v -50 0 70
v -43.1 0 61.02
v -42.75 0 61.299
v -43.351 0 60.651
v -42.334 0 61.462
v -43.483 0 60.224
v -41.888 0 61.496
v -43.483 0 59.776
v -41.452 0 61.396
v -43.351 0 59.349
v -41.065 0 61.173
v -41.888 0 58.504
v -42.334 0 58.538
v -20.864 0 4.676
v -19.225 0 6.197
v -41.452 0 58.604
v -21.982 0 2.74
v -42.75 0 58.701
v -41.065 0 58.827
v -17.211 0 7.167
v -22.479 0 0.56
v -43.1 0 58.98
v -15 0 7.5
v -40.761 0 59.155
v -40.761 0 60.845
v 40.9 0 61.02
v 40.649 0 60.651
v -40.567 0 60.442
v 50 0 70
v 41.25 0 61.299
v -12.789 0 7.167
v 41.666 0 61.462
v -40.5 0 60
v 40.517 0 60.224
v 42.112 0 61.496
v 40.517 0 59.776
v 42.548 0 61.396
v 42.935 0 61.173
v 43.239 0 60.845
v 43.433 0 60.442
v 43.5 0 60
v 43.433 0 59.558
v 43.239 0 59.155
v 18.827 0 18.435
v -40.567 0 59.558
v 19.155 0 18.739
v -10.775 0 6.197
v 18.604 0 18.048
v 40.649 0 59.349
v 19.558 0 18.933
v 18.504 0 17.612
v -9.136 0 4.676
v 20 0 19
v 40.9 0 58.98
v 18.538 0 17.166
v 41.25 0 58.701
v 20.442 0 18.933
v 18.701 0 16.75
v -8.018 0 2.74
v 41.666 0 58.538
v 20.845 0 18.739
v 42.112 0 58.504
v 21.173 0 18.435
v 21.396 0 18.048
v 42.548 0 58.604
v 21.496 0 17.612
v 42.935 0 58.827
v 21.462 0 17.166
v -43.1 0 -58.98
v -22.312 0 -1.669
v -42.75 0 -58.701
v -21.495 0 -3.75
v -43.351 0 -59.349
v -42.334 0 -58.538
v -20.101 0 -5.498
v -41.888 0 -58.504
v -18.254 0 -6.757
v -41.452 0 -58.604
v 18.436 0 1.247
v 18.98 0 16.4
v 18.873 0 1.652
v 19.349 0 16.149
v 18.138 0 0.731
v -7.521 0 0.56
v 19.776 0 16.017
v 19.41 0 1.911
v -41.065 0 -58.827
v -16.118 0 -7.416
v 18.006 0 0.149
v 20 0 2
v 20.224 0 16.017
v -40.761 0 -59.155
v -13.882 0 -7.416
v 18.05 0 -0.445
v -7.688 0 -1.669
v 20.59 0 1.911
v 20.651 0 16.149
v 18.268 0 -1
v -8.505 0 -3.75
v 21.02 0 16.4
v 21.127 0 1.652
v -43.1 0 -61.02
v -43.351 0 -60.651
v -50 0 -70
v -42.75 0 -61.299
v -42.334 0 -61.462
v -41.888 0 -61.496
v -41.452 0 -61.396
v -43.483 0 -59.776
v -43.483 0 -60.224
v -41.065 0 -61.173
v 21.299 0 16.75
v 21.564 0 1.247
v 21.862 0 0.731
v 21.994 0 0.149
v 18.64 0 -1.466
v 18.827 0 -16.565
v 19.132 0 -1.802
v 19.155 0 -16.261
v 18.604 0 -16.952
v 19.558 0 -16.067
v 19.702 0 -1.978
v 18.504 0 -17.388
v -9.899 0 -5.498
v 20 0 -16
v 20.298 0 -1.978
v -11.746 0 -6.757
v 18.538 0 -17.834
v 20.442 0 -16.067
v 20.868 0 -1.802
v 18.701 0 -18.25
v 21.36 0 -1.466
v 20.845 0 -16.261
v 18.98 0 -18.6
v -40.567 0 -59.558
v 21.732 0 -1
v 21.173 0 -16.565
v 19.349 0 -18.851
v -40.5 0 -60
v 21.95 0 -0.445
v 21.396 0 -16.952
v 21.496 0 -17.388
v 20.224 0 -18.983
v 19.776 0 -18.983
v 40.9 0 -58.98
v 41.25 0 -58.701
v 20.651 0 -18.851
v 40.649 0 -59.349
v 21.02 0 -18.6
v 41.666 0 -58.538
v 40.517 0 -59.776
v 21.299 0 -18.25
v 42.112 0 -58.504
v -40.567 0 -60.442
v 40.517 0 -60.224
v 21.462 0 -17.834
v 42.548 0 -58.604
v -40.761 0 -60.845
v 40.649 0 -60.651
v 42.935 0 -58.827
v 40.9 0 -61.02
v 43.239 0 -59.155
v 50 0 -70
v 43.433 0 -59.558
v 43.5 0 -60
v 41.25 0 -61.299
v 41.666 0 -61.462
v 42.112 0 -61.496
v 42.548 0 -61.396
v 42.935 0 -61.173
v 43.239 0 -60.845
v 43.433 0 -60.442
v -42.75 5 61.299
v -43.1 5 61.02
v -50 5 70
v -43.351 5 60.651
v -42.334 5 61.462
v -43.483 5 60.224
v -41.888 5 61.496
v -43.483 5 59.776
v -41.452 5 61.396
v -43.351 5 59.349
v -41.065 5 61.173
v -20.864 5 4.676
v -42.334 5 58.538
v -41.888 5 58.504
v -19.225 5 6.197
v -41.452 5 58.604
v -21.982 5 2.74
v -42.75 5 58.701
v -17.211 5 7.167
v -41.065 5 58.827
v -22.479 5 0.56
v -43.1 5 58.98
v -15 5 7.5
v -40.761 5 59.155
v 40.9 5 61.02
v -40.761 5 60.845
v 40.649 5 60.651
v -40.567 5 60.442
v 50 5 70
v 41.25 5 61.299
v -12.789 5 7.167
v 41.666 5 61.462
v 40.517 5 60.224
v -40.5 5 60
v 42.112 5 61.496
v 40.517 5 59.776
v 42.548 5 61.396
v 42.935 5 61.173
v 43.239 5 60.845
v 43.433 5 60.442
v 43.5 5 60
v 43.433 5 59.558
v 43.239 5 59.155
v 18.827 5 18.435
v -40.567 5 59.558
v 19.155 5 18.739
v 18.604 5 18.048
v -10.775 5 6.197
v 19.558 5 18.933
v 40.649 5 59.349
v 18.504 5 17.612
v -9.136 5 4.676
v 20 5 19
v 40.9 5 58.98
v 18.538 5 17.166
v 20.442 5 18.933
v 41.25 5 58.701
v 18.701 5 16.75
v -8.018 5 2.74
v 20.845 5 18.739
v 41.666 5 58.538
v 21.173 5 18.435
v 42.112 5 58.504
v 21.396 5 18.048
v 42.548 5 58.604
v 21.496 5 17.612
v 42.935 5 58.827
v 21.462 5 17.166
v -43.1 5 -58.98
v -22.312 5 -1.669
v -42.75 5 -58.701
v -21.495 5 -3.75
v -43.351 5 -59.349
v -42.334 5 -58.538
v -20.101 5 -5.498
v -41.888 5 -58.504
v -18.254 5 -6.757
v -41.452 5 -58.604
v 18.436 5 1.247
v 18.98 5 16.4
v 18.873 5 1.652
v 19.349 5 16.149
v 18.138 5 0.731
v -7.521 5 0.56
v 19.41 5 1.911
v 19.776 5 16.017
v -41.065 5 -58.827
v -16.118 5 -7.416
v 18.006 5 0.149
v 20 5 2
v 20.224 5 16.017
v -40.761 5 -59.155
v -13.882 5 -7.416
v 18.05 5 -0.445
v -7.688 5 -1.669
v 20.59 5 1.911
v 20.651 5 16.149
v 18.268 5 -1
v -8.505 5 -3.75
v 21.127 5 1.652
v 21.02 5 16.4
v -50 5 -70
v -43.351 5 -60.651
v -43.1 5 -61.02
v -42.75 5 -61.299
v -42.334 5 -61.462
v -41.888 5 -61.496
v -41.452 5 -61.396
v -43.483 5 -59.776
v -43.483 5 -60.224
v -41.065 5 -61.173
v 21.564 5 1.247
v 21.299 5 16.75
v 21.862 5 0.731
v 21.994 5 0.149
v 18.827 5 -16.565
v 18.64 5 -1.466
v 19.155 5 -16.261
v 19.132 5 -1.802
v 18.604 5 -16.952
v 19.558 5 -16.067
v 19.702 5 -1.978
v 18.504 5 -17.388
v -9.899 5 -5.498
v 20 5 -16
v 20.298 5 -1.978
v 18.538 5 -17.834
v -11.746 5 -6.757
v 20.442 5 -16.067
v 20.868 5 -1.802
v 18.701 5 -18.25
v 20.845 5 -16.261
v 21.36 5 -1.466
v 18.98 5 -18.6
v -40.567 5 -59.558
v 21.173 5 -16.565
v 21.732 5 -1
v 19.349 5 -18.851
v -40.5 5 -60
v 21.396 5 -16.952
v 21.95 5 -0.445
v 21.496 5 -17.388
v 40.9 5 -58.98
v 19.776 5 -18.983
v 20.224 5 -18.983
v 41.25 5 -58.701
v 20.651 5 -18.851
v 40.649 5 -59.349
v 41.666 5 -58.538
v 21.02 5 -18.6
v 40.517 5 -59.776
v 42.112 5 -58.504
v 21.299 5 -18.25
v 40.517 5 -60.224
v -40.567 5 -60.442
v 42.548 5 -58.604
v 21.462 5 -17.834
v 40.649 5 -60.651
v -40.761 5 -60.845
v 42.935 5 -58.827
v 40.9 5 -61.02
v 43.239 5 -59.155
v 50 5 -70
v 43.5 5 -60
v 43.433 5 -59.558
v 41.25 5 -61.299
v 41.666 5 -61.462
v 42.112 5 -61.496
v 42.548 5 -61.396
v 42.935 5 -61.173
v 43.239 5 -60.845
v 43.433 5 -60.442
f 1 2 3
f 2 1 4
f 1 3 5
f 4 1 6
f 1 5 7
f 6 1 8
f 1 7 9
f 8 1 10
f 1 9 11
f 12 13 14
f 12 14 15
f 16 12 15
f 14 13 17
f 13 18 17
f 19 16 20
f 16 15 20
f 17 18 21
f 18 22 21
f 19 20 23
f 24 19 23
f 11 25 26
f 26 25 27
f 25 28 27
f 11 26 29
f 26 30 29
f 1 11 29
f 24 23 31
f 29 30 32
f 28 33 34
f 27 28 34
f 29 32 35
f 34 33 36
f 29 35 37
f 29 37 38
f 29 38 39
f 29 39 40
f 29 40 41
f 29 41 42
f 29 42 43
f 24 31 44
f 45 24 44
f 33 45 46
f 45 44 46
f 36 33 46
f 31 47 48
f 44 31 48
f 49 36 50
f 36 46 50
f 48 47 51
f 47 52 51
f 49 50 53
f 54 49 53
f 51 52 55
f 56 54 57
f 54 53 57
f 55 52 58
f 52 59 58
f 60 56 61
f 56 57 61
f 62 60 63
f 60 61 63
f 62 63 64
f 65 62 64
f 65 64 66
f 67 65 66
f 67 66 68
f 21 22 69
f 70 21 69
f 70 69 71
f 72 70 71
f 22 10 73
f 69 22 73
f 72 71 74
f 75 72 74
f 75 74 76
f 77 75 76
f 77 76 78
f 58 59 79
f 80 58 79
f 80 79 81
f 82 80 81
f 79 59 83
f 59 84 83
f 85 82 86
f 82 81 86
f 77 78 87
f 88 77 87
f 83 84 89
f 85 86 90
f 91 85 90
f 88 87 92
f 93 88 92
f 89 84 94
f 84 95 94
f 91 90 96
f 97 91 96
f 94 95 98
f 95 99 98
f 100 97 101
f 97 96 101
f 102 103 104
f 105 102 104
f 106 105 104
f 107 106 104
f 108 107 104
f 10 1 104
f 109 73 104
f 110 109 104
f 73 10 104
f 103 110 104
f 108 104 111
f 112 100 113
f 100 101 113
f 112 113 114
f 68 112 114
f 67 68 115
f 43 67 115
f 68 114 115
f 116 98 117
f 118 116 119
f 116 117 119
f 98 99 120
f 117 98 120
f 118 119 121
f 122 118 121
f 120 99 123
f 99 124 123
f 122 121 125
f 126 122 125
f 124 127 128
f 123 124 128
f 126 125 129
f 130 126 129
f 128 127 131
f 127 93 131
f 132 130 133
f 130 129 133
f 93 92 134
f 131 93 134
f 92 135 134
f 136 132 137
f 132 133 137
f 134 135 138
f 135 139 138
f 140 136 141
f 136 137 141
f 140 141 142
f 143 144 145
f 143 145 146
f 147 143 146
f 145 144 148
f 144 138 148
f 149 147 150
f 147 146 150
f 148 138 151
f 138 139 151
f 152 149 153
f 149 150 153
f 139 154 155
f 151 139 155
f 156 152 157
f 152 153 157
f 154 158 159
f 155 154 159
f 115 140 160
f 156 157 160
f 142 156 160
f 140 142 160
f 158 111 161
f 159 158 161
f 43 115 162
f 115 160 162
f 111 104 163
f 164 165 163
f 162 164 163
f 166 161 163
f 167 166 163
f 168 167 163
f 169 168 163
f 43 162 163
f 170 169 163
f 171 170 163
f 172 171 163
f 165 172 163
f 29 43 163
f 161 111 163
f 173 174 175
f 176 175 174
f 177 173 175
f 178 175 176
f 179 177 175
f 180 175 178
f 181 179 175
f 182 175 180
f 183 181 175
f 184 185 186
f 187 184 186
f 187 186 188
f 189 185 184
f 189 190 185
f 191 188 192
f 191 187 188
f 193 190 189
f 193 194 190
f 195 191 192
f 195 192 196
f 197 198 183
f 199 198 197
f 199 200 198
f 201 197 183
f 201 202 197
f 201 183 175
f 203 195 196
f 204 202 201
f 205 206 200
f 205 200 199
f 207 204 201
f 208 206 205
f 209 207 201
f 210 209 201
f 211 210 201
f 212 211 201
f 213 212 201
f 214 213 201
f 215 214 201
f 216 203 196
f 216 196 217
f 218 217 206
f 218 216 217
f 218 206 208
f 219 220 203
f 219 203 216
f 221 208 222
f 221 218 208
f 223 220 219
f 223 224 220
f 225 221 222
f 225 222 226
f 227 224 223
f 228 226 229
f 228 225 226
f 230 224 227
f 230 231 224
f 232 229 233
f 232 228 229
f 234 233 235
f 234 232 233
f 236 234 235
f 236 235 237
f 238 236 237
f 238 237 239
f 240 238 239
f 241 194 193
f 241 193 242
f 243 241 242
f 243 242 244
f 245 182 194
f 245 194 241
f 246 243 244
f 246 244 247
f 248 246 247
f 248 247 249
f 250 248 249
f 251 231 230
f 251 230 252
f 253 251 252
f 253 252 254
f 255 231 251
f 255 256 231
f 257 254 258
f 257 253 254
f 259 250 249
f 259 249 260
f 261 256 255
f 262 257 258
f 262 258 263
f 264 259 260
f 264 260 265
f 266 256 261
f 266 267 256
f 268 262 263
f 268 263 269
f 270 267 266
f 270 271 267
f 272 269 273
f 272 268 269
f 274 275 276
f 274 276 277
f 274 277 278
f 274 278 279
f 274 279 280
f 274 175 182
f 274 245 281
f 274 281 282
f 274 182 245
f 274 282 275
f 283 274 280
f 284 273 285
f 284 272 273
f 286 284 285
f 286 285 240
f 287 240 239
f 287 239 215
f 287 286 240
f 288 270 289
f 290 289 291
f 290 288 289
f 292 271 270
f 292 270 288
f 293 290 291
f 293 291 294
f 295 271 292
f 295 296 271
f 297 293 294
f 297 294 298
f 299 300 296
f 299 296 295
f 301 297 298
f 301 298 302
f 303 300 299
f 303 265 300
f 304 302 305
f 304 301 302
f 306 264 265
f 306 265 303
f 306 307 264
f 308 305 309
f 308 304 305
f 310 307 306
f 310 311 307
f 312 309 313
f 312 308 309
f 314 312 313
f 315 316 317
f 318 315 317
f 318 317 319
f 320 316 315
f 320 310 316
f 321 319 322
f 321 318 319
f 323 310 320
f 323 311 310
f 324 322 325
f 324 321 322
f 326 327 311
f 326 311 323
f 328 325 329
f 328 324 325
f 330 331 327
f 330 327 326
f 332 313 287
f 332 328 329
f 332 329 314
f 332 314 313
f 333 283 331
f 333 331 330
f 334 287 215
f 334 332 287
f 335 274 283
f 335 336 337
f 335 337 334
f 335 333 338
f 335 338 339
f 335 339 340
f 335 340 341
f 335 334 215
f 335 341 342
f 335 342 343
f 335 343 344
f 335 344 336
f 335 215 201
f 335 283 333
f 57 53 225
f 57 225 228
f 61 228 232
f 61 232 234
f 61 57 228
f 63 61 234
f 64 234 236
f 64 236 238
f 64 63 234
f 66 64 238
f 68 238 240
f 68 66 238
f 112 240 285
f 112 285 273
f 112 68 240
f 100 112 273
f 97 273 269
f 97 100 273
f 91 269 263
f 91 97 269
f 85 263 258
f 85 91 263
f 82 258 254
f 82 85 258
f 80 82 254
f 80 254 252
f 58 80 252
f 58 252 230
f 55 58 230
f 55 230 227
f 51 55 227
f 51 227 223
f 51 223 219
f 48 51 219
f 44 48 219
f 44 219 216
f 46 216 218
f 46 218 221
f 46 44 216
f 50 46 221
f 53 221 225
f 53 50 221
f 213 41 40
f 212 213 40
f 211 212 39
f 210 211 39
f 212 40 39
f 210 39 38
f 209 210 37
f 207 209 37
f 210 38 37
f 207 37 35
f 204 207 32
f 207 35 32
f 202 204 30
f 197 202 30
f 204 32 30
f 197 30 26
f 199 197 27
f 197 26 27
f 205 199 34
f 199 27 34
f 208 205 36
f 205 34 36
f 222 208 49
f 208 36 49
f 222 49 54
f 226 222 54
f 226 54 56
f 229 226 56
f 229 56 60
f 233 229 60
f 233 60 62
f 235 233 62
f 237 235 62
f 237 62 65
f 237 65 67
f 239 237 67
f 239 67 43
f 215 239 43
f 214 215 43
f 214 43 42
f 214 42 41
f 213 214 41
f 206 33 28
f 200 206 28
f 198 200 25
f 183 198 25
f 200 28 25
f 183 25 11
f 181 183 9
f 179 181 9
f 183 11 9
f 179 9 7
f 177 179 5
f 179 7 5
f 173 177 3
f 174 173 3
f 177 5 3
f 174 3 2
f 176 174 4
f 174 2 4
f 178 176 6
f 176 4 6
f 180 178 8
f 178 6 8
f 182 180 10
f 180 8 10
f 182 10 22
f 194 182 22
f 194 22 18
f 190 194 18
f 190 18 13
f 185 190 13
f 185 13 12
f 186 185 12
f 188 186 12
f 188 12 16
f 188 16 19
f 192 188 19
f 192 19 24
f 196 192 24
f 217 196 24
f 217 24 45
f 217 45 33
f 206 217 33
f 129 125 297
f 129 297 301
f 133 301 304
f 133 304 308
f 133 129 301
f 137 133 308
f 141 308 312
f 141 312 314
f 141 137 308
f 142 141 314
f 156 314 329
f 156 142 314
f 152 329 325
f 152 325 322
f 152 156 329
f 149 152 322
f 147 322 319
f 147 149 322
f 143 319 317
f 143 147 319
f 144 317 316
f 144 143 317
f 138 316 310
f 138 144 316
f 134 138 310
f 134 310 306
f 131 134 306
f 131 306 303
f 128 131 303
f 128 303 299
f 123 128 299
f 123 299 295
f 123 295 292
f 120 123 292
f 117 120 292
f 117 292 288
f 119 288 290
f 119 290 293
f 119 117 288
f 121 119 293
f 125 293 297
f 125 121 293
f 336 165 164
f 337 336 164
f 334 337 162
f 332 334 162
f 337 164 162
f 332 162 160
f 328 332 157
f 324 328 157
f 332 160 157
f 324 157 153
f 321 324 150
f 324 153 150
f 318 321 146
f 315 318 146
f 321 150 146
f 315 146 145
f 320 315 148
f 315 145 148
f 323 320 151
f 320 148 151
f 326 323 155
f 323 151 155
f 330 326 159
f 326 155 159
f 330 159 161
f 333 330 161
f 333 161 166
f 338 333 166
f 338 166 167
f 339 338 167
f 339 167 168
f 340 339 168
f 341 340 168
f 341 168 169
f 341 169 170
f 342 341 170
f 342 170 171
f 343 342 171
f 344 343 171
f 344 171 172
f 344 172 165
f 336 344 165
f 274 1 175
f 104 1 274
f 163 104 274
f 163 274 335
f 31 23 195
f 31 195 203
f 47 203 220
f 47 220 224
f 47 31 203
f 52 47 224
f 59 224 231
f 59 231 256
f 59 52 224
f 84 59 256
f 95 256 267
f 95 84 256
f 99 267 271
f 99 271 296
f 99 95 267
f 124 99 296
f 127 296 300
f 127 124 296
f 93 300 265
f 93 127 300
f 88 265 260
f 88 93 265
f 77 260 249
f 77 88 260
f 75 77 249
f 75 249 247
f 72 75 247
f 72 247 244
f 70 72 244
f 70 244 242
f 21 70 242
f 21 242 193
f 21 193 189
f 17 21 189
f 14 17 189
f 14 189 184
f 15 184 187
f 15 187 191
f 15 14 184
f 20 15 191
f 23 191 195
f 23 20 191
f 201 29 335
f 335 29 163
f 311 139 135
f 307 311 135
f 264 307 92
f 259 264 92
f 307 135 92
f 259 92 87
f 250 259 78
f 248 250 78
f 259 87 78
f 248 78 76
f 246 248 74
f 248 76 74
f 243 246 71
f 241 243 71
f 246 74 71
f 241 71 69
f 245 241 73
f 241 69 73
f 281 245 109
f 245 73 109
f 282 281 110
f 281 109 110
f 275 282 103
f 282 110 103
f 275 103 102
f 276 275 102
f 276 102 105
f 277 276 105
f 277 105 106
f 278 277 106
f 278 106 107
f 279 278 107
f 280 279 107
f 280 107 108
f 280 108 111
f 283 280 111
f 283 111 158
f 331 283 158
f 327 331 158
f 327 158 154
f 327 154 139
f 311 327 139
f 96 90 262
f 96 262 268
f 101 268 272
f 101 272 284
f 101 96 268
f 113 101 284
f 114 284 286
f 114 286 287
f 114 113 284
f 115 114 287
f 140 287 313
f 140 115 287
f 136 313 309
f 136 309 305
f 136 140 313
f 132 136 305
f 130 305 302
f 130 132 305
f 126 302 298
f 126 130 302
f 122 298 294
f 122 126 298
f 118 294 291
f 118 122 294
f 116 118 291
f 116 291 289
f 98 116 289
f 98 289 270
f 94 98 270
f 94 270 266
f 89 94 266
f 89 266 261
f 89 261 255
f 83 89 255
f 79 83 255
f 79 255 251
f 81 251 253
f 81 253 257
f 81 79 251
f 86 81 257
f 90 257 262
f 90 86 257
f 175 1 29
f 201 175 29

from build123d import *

# Parameters (mm, degrees)
SKETCH1_W                = 100
SKETCH1_H                = 140
SKETCH1_R                = 7.5
SKETCH1_R_2              = 2
SKETCH1_R_3              = 1.5
BOSS_EXTRUDE1_DEPTH      = 5
F_3_0_3_DIAMETER_HOLE1_D = 3


with BuildPart() as part:
    # Sketch1 → Boss-Extrude1 (new body)
    with BuildSketch(Plane(origin=(0, 0, 0), x_dir=(1, 0, 0), z_dir=(0, 1, 0))):
        Rectangle(SKETCH1_W, SKETCH1_H)
        with Locations((-15, 0)):
            Circle(SKETCH1_R, mode=Mode.SUBTRACT)
        with Locations((20, 0)):
            Circle(SKETCH1_R_2, mode=Mode.SUBTRACT)
        with Locations((20, -17.5)):
            Circle(SKETCH1_R_3, mode=Mode.SUBTRACT)
        with Locations((20, 17.5)):
            Circle(SKETCH1_R_3, mode=Mode.SUBTRACT)
    extrude(amount=BOSS_EXTRUDE1_DEPTH)

    # Ø3.0 (3) Diameter Hole1 (through all)
    with Locations(Plane(origin=(0, 5, 0), x_dir=(-1, 0, 0), z_dir=(0, 1, 0))):
        with Locations((-42, 60), (42, 60), (42, -60), (-42, -60)):
            Hole(F_3_0_3_DIAMETER_HOLE1_D / 2)


solid = part.part
